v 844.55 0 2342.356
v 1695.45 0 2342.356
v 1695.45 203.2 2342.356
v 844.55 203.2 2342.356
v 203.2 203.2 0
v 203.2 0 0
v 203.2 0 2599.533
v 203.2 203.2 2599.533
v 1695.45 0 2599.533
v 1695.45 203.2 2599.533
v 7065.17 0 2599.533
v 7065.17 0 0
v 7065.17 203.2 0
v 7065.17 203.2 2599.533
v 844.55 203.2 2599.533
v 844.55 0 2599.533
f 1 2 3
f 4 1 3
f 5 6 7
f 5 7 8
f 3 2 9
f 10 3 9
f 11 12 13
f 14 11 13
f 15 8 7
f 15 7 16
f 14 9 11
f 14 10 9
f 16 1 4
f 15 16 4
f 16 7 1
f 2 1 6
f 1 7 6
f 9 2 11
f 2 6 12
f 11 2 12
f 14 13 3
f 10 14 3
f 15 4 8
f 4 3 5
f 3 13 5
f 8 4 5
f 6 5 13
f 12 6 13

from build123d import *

# Parameters (mm, degrees)
F0_W      = 7268.37002
F0_H      = 4074.32002
F0_W_2    = 6861.97002
F0_H_2    = 3667.92002
F1_DEPTH  = 2599.53252
F2_W      = 431.8
F2_H      = 133.35
F3_DEPTH  = 203.2
F4_W      = 304.8
F4_H      = 254
F5_DEPTH  = 203.2
F6_DEPTH  = 381
F7_DEPTH  = 254
F8_DEPTH  = 106.68
F9_DEPTH  = 38.1
F10_DEPTH = 17.14627
F11_DEPTH = 3871.12002
F12_DEPTH = 203.2
F13_DEPTH = 203.2


with BuildPart() as f1:
    # F0 (on Top) → F1 (new body)
    with BuildSketch(Plane.XY):
        with Locations((3634.18501, 2037.16001)):
            Rectangle(F0_W, F0_H)
        with Locations((3634.18501, 2037.16001)):
            Rectangle(F0_W_2, F0_H_2, mode=Mode.SUBTRACT)
    extrude(amount=F1_DEPTH)

    # F2 (on Front) → F3 (cut)
    with BuildSketch(Plane.XZ):
        with Locations((1479.55, 2409.03125)):
            Rectangle(F2_W, F2_H)
    extrude(amount=-F3_DEPTH, mode=Mode.SUBTRACT)

    # F4 (on face) → F5 (cut)
    with BuildSketch(Plane(origin=(0, 203.2, 0), x_dir=(-1, 0, 0), z_dir=(0, 1, 0))):
        with Locations((-6077.74502, 2362.2)):
            Rectangle(F4_W, F4_H)
    extrude(amount=-F5_DEPTH, mode=Mode.SUBTRACT)

    # F6 (cut): a face of the model
    f6_faces = [f1.faces().sort_by_distance(p)[0] for p in [
        (1263.65, 101.6, 2409.03125),
    ]]
    extrude(f6_faces, amount=-F6_DEPTH, mode=Mode.SUBTRACT)

    # F7 (add, through all): a face of the model
    f7_faces = [f1.faces().sort_by_distance(p)[0] for p in [
        (6077.74502, 101.6, 2235.2),
    ]]
    extrude(f7_faces, amount=F7_DEPTH)

    # F8 (cut): a face of the model
    f8_faces = [f1.faces().sort_by_distance(p)[0] for p in [
        (1289.05, 101.6, 2475.70625),
    ]]
    extrude(f8_faces, amount=-F8_DEPTH, mode=Mode.SUBTRACT)

    # F9 (cut): a face of the model
    f9_faces = [f1.faces().sort_by_distance(p)[0] for p in [
        (882.65, 101.6, 2462.37125),
    ]]
    extrude(f9_faces, amount=-F9_DEPTH, mode=Mode.SUBTRACT)

    # F10 (cut, through all): a face of the model
    f10_faces = [f1.faces().sort_by_distance(p)[0] for p in [
        (1270, 101.6, 2582.38625),
    ]]
    extrude(f10_faces, amount=-F10_DEPTH, mode=Mode.SUBTRACT)

    # F11 (cut, through all): a face of the model
    f11_faces = [f1.faces().sort_by_distance(p)[0] for p in [
        (3634.18501, 4074.32002, 1299.76626),
    ]]
    extrude(f11_faces, amount=-F11_DEPTH, mode=Mode.SUBTRACT)

    # F12 (cut): a face of the model
    f12_faces = [f1.faces().sort_by_distance(p)[0] for p in [
        (7268.37002, 101.6, 1299.76626),
    ]]
    extrude(f12_faces, amount=-F12_DEPTH, mode=Mode.SUBTRACT)

    # F13 (cut): a face of the model
    f13_faces = [f1.faces().sort_by_distance(p)[0] for p in [
        (0, 101.6, 1299.76626),
    ]]
    extrude(f13_faces, amount=-F13_DEPTH, mode=Mode.SUBTRACT)


solid = f1.part
